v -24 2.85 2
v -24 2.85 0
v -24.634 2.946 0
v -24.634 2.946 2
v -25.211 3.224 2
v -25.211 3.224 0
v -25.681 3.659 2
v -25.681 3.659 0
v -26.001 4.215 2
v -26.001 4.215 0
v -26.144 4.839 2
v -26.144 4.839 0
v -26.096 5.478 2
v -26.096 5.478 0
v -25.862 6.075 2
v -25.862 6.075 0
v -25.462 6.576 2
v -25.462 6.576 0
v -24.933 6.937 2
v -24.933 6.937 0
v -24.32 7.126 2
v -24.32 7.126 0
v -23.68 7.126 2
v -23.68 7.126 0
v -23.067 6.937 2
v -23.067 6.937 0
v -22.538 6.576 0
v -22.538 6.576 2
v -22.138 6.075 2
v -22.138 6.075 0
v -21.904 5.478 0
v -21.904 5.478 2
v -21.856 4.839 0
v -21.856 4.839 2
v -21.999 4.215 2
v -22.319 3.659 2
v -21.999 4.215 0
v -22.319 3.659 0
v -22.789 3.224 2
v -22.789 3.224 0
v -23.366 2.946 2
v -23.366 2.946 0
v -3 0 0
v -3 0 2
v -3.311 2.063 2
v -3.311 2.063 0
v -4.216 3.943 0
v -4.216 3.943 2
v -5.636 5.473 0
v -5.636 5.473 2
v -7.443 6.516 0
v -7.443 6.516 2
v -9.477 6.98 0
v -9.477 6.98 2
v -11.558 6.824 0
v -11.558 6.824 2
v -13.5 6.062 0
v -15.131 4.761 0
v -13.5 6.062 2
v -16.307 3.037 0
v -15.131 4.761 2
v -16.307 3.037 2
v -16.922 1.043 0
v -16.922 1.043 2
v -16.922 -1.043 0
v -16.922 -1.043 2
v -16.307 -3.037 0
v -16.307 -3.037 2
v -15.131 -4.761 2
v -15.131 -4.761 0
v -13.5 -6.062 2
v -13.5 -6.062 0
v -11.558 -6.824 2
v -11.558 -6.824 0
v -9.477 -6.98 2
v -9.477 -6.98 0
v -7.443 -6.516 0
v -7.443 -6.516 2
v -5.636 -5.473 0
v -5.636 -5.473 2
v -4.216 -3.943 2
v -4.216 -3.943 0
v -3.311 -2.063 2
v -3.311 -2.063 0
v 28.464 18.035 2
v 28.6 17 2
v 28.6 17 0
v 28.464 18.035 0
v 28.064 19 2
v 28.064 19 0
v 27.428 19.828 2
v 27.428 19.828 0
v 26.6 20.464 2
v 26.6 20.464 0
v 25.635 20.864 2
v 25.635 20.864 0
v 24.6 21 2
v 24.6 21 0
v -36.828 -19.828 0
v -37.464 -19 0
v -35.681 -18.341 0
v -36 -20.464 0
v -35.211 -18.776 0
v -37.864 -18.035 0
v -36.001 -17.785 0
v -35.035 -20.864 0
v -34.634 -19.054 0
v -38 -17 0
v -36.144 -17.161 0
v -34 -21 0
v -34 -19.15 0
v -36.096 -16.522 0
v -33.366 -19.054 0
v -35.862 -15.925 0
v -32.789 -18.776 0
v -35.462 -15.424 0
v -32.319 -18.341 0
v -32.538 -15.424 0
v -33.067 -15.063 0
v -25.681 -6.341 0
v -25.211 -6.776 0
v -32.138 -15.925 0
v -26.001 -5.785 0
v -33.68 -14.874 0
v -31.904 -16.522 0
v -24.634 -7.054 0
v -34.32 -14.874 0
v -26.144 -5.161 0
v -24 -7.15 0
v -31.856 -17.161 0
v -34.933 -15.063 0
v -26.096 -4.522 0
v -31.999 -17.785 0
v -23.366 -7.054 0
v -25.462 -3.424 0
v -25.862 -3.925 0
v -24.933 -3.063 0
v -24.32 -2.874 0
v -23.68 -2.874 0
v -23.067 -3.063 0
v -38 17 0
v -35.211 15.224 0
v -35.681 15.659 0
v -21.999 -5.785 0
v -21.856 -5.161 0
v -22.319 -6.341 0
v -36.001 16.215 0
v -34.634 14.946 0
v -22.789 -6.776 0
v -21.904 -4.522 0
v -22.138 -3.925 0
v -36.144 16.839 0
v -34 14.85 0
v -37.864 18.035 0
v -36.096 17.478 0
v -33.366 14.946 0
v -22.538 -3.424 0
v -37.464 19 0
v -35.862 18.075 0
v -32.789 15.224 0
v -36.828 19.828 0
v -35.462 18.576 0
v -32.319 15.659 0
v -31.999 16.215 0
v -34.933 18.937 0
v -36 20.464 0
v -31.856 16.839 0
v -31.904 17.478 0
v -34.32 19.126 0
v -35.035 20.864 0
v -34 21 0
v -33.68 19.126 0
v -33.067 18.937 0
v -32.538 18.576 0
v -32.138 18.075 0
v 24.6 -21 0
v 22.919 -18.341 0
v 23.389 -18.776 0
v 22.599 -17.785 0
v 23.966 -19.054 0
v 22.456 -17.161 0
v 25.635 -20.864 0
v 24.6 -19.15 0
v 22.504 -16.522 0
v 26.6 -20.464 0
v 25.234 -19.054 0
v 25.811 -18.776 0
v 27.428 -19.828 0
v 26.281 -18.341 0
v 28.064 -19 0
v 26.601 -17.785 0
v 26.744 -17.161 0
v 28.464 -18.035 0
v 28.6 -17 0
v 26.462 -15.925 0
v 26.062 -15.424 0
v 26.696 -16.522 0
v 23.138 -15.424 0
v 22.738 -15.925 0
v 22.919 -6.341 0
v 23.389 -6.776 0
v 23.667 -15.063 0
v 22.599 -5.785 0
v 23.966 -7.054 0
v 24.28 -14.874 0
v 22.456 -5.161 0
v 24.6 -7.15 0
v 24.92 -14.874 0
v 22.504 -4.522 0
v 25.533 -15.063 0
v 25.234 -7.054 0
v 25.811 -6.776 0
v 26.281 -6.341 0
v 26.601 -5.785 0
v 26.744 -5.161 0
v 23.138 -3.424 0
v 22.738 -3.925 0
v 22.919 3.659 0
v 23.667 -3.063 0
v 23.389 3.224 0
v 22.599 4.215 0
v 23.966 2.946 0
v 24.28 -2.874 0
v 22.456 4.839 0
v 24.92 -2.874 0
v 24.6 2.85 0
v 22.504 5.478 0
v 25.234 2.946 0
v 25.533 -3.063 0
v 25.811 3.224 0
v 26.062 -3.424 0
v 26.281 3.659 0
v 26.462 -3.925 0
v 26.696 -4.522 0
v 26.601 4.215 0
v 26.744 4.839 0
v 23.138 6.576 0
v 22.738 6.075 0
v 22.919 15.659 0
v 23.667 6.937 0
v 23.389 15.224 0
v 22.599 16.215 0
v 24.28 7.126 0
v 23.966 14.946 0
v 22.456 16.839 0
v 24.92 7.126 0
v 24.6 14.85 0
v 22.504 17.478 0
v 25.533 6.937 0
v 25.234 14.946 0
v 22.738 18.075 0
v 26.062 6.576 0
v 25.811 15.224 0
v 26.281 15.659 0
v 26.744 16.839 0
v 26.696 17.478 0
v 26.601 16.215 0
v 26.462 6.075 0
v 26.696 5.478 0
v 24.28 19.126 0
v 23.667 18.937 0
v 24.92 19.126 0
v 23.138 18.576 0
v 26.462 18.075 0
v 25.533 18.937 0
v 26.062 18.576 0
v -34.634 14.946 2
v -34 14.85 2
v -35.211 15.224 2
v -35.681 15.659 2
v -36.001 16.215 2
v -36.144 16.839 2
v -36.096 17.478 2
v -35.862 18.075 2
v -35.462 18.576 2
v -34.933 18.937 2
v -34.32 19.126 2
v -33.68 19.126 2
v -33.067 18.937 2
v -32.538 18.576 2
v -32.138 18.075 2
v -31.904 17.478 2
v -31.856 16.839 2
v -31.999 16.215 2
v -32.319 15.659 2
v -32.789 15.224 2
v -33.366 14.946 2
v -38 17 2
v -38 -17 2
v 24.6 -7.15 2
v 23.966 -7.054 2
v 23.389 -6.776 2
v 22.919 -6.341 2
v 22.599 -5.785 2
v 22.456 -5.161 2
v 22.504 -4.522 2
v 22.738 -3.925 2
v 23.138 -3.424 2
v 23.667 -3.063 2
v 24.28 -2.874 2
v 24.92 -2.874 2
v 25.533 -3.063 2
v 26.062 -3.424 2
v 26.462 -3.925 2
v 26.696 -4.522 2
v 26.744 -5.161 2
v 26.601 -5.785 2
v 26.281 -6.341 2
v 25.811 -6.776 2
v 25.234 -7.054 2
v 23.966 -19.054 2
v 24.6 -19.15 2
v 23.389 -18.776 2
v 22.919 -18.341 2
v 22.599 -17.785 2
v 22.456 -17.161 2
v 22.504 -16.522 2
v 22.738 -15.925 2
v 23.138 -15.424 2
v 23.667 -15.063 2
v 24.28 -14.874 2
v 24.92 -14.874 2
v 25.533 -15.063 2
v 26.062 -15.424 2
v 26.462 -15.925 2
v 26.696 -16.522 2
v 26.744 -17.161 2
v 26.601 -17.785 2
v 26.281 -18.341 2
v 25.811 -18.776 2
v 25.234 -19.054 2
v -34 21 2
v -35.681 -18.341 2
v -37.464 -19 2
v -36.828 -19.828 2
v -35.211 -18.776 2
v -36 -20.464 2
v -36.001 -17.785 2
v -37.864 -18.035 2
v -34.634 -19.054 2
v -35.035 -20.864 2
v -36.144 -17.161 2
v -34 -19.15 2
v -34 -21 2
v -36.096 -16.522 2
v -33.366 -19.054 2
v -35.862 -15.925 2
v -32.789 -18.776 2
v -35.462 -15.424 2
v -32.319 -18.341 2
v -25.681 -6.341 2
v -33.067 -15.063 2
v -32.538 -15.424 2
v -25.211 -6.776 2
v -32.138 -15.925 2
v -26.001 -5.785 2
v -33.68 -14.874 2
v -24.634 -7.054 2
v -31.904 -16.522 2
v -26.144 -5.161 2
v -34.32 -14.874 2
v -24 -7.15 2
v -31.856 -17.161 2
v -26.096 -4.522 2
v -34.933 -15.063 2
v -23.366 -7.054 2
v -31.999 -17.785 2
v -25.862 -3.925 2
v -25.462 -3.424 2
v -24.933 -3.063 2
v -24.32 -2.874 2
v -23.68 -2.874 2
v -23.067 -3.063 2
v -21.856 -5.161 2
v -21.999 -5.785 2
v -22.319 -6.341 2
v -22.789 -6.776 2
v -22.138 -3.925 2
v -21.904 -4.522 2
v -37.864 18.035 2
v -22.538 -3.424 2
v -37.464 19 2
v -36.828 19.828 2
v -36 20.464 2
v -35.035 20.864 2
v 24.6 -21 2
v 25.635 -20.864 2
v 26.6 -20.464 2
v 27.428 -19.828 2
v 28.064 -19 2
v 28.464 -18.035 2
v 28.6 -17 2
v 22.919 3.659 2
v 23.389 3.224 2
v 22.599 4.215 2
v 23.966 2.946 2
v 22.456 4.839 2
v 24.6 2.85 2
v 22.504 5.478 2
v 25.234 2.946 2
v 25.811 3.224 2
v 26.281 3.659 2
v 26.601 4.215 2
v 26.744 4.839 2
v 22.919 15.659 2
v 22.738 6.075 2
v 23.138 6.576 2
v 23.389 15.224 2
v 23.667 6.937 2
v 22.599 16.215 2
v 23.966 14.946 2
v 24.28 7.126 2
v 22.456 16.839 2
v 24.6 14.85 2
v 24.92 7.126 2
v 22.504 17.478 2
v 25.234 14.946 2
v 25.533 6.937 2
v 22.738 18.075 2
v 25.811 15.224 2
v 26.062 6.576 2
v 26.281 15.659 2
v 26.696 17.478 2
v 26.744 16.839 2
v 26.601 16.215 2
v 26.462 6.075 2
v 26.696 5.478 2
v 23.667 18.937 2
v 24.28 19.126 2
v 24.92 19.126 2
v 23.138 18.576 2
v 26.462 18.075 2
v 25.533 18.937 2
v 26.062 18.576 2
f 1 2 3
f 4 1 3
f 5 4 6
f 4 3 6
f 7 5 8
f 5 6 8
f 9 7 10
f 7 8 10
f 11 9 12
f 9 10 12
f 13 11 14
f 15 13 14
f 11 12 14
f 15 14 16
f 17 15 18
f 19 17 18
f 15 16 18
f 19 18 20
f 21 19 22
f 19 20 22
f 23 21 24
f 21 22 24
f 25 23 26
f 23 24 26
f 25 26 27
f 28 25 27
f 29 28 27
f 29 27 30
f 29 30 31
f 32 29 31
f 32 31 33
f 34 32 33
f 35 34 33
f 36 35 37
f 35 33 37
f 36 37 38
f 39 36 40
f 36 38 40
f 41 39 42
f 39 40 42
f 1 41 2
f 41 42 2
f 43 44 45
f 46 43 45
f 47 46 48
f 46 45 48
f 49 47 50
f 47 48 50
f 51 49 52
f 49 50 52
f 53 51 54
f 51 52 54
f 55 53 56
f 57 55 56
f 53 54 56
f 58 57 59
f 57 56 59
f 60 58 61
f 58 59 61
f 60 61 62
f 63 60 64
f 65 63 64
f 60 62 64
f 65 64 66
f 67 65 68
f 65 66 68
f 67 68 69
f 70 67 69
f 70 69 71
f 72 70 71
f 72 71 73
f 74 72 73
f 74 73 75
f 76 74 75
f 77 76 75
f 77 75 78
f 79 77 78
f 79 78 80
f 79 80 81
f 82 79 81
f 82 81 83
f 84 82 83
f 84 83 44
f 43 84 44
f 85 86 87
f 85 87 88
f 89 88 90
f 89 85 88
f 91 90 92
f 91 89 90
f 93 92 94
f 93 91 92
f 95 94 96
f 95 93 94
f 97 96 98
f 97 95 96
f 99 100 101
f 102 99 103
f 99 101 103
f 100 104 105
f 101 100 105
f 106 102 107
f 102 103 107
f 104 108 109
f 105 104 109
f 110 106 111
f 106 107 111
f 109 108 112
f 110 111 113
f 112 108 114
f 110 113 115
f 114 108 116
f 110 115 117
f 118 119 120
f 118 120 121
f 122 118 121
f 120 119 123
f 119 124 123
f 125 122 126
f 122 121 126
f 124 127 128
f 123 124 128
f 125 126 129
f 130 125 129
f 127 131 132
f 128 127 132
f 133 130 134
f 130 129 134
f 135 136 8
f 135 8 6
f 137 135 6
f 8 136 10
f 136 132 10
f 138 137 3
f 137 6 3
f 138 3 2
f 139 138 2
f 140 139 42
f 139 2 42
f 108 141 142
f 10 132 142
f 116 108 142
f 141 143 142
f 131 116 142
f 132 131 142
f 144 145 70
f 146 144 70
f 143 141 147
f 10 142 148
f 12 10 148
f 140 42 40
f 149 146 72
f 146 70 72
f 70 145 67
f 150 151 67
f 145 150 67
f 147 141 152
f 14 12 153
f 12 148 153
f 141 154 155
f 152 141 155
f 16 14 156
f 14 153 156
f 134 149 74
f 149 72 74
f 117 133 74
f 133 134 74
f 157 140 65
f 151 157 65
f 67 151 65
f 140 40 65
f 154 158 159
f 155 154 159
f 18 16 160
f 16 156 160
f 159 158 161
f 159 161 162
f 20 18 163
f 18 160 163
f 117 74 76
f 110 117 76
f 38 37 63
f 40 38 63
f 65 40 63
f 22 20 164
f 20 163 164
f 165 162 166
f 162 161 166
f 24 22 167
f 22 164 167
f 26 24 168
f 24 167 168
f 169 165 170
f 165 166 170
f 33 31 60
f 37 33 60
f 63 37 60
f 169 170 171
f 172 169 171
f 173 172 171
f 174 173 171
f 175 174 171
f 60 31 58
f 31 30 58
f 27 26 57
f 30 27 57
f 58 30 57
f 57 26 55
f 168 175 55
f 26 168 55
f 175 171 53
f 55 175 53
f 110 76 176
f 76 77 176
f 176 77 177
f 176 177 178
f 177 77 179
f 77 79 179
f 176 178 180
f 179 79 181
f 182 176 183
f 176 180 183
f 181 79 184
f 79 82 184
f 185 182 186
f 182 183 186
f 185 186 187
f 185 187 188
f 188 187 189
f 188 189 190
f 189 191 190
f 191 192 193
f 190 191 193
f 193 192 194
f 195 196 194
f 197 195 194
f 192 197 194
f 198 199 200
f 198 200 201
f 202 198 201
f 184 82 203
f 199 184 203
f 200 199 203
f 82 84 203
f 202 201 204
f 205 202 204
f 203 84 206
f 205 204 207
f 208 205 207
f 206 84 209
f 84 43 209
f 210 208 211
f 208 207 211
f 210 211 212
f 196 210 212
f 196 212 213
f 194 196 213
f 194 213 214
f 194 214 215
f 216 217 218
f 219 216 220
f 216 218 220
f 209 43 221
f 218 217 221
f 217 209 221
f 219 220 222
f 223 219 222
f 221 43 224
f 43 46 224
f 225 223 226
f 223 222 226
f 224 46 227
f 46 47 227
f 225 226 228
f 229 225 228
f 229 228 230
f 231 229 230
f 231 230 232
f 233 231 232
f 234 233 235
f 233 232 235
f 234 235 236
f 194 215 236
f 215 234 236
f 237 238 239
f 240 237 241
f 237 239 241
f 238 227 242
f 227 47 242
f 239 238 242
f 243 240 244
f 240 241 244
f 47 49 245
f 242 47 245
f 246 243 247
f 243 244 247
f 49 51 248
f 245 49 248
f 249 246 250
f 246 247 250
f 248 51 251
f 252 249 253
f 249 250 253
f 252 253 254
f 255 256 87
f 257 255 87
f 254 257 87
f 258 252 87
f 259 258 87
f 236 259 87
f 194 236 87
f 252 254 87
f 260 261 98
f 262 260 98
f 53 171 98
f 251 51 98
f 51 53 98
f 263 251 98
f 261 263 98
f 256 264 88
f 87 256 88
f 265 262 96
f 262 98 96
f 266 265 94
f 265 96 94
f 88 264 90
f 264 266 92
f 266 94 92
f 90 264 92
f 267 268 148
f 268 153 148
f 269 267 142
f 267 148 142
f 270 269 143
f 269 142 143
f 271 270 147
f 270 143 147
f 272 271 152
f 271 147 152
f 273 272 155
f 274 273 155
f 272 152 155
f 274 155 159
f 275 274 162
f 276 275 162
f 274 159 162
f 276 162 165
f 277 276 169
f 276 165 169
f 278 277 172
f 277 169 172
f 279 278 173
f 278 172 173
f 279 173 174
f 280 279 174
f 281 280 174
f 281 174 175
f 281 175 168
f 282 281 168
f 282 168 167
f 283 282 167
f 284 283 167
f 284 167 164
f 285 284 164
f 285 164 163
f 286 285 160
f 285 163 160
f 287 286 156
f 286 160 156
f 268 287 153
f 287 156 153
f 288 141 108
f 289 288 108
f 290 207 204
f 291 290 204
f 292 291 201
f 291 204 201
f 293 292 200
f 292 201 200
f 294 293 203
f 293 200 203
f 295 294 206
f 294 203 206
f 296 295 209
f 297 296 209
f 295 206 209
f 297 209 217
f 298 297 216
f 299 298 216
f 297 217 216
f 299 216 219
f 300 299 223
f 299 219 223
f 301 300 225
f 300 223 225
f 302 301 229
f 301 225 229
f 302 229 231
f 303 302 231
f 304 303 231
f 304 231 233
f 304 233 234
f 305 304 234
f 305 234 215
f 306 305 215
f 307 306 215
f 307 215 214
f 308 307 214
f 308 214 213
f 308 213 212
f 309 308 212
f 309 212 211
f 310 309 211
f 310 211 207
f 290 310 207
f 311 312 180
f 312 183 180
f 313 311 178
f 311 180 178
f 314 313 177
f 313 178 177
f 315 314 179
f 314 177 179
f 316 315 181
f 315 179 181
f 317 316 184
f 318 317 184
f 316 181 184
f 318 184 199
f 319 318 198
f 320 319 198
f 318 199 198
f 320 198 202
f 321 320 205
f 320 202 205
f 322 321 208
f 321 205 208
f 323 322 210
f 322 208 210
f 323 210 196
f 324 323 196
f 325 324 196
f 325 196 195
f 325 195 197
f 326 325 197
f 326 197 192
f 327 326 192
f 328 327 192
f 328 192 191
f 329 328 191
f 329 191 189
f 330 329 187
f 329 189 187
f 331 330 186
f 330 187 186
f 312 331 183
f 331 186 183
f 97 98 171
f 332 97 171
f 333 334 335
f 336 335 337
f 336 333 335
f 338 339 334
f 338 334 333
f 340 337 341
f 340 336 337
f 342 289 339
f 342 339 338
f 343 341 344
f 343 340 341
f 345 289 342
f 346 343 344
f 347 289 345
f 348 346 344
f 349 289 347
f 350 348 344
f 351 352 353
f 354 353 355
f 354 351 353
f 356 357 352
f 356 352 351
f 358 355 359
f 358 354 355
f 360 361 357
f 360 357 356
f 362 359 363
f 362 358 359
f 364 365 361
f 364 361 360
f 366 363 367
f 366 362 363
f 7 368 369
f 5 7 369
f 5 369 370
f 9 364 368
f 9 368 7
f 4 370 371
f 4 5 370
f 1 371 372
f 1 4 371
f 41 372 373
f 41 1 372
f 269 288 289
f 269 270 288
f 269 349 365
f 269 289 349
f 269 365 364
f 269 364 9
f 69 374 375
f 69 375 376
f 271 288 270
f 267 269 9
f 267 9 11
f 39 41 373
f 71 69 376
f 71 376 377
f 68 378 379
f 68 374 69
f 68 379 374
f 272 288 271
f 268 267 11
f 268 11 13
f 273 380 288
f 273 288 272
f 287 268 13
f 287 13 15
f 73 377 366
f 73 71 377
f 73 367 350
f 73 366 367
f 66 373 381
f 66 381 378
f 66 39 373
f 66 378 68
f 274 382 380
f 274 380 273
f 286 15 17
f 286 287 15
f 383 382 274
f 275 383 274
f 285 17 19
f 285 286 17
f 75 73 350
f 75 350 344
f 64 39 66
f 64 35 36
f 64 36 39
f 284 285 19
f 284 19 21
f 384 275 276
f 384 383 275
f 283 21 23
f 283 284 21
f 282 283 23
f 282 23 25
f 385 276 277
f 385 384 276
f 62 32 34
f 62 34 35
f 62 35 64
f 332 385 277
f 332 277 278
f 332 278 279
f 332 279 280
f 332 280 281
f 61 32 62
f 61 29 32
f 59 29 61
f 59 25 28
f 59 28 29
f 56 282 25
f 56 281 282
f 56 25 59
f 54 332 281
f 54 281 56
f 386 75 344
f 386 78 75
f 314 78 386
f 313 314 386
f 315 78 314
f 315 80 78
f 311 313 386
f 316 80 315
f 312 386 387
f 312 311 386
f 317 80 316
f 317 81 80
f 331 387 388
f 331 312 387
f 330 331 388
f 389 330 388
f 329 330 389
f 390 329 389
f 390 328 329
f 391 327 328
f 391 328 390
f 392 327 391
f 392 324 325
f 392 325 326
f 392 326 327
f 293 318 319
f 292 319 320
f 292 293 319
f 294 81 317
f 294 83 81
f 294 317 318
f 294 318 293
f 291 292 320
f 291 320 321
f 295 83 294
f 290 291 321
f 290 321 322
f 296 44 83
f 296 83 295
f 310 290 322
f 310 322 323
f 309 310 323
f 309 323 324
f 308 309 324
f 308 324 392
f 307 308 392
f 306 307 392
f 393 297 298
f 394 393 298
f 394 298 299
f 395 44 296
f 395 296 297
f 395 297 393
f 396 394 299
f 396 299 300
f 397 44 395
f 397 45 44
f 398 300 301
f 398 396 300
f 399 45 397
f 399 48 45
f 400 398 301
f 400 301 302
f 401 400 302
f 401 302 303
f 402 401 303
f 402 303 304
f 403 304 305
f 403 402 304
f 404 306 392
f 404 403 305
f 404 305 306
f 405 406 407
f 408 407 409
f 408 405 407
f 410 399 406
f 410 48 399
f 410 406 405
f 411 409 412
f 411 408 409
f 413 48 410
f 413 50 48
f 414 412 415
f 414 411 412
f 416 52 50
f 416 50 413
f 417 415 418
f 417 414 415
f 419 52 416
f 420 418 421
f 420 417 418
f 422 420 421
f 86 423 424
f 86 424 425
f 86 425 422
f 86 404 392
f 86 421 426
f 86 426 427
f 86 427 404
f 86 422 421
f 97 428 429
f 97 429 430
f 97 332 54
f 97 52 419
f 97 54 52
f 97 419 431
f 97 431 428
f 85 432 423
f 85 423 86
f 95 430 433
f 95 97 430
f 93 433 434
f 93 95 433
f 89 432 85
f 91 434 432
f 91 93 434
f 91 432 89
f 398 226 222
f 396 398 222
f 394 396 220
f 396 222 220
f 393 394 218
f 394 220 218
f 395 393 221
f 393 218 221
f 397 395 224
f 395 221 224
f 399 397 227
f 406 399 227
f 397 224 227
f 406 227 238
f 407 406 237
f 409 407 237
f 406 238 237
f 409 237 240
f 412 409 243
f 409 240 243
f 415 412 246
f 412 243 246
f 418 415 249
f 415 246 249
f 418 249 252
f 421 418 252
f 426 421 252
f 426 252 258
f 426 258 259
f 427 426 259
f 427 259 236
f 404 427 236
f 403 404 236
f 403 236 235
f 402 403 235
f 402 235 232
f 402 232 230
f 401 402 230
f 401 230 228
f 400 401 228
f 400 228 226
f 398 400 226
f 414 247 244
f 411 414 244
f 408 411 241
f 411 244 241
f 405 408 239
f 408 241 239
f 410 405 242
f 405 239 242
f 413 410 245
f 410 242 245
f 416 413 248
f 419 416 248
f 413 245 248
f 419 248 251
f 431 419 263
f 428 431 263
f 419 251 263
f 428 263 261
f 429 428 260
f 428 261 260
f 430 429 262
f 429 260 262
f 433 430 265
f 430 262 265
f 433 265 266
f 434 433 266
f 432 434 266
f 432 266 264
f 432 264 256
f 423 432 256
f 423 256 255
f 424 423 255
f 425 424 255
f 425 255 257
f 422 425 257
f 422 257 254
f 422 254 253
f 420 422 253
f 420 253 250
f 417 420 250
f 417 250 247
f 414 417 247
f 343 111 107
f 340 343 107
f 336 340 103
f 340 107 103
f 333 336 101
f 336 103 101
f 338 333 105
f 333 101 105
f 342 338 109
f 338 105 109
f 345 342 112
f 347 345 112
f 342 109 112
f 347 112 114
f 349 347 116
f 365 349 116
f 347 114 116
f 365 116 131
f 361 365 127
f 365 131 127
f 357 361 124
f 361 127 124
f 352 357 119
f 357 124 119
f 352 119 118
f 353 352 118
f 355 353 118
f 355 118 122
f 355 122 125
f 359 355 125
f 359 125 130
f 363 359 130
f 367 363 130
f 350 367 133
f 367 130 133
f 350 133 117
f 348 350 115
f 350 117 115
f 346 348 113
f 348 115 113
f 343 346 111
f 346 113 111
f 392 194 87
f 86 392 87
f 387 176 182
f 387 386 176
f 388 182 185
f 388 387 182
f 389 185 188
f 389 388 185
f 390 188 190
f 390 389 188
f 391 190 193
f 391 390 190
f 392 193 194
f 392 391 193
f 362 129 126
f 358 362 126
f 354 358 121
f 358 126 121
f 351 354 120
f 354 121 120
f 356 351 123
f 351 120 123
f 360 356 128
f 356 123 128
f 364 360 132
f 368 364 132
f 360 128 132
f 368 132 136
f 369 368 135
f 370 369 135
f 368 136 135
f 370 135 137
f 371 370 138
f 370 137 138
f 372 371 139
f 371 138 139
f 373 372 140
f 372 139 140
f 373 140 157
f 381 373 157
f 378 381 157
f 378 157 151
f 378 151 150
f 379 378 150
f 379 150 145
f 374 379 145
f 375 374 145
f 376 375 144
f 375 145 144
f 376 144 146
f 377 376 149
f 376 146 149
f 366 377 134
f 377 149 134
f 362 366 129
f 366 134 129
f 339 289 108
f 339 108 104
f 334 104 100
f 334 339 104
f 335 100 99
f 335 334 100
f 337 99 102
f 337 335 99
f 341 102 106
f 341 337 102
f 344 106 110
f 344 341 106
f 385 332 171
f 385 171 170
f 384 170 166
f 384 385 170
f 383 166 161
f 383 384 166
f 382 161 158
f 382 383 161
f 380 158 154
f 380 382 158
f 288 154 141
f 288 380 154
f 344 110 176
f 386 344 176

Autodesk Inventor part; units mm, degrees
ref_plane "YZ Plane" through (0, 0, 0) normal (1, 0, 0) x (0, 1, 0)
ref_plane "XZ Plane" through (0, 0, 0) normal (0, 1, 0) x (-1, 0, 0)
ref_plane "XY Plane" through (0, 0, 0) normal (0, 0, 1) x (1, 0, 0)
sketch "スケッチ1" plane through (0, 0, 0) normal (0, 0, 1) x (1, 0, 0)
  line L0 (-38, -21) -> (28.6, -21)
  line L1 (28.6, -21) -> (28.6, 21)
  line L2 (28.6, 21) -> (-38, 21)
  line L3 (-38, 21) -> (-38, -21)
  point P0 (0, 0)
  dimension "d1" = 42
  dimension "d28" = 38
  dimension "d29" = 28.6
  dimension "d32" = 21
extrude "プレート1" add sketch "スケッチ1" along normal blind 2
sketch "スケッチ2" plane through (0, 0, 2) normal (0, 0, 1) x (1, 0, 0)
  line L0 (-24, -5) -> (24.6, -5)
  line L1 (24.6, -5) -> (24.6, 5)
  line L2 (24.6, 5) -> (-24, 5)
  line L3 (-24, 5) -> (-24, -5)
  line L4 (-24, -5) -> (24.6, 5) construction
  line L5 (24.6, -5) -> (-24, 5) construction
  line L6 (28.6, -21) -> (-38, -21) projected
  line L7 (-38, -21) -> (-38, 21) projected
  line L8 (28.6, -21) -> (-38, -21) projected
  line L9 (28.6, 21) -> (28.6, -21) projected
  line L10 (-38, 21) -> (28.6, 21) projected
  circle A0 centre (-10, 0) radius 7
  point P0 (0.3, 0)
  point P1 (0.3, 0)
  point P2 (0.3, 0)
  point P3 (0, 0)
  dimension "d3" = 48.6
  dimension "d5" = 10
  dimension "d16" = 14
  dimension "d31" = 14
  dimension "d33" = 4
  dimension "d34" = 0
hole "穴1" at (24.6, 5, 2) at (24.6, -5, 2) at (-24, 5, 2) at (-24, -5, 2) direction (0, 0, -1) diameter 4.3 end through all clearance for "Socket Head Cap Screw" size "M4" standard "Ansi Metric M Profile"
extrude "押し出し1" cut sketch "スケッチ2" against normal blind 10 contours A0 L2 L0 | L0 A0 | A0 L2
sketch "スケッチ3" plane through (0, 0, 2) normal (0, 0, 1) x (1, 0, 0)
  line L0 (-38, 21) -> (28.6, 21) projected
  line L1 (-38, -21) -> (-38, 21) projected
  line L2 (28.6, -21) -> (-38, -21) projected
  line L3 (28.6, 21) -> (28.6, -21) projected
  line L4 (24.6, 17) -> (-34, 17)
  line L5 (-34, 17) -> (-34, -17)
  line L6 (-34, -17) -> (24.6, -17)
  line L7 (24.6, -17) -> (24.6, 17)
  point P0 (0, 0)
  dimension "d19" = 4
hole "穴2" at (-34, 17, 2) at (-34, -17, 2) at (24.6, 17, 2) at (24.6, -17, 2) direction (0, 0, -1) diameter 4.3 end through all clearance for "Socket Head Cap Screw" size "M4" standard "Ansi Metric M Profile"
fillet "コーナーR1" radius 4 4 edges at (28.6, 21, 1) (-38, 21, 1) (-38, -21, 1) (28.6, -21, 1)
equation "\"d14\" = Thickness"
equation "\"d2\" = Thickness"
equation "\"d32\" = 0.5 * d1"
equation "\"BendRadius\" = Thickness"
equation "\"BendReliefWidth\" = Thickness"
equation "\"BendReliefDepth\" = 0.5 * Thickness"
equation "\"CornerReliefSize\" = 4 * Thickness"
equation "\"MinimumRemnant\" = 2 * Thickness"
equation "\"TransitionRadius\" = BendRadius"
equation "\"JacobiRadiusSize\" = BendRadius"
equation "\"GapSize\" = Thickness"
equation "\"Thickness\" = 2"
properties part number "s_carbon_plate8" material "CFRP"
